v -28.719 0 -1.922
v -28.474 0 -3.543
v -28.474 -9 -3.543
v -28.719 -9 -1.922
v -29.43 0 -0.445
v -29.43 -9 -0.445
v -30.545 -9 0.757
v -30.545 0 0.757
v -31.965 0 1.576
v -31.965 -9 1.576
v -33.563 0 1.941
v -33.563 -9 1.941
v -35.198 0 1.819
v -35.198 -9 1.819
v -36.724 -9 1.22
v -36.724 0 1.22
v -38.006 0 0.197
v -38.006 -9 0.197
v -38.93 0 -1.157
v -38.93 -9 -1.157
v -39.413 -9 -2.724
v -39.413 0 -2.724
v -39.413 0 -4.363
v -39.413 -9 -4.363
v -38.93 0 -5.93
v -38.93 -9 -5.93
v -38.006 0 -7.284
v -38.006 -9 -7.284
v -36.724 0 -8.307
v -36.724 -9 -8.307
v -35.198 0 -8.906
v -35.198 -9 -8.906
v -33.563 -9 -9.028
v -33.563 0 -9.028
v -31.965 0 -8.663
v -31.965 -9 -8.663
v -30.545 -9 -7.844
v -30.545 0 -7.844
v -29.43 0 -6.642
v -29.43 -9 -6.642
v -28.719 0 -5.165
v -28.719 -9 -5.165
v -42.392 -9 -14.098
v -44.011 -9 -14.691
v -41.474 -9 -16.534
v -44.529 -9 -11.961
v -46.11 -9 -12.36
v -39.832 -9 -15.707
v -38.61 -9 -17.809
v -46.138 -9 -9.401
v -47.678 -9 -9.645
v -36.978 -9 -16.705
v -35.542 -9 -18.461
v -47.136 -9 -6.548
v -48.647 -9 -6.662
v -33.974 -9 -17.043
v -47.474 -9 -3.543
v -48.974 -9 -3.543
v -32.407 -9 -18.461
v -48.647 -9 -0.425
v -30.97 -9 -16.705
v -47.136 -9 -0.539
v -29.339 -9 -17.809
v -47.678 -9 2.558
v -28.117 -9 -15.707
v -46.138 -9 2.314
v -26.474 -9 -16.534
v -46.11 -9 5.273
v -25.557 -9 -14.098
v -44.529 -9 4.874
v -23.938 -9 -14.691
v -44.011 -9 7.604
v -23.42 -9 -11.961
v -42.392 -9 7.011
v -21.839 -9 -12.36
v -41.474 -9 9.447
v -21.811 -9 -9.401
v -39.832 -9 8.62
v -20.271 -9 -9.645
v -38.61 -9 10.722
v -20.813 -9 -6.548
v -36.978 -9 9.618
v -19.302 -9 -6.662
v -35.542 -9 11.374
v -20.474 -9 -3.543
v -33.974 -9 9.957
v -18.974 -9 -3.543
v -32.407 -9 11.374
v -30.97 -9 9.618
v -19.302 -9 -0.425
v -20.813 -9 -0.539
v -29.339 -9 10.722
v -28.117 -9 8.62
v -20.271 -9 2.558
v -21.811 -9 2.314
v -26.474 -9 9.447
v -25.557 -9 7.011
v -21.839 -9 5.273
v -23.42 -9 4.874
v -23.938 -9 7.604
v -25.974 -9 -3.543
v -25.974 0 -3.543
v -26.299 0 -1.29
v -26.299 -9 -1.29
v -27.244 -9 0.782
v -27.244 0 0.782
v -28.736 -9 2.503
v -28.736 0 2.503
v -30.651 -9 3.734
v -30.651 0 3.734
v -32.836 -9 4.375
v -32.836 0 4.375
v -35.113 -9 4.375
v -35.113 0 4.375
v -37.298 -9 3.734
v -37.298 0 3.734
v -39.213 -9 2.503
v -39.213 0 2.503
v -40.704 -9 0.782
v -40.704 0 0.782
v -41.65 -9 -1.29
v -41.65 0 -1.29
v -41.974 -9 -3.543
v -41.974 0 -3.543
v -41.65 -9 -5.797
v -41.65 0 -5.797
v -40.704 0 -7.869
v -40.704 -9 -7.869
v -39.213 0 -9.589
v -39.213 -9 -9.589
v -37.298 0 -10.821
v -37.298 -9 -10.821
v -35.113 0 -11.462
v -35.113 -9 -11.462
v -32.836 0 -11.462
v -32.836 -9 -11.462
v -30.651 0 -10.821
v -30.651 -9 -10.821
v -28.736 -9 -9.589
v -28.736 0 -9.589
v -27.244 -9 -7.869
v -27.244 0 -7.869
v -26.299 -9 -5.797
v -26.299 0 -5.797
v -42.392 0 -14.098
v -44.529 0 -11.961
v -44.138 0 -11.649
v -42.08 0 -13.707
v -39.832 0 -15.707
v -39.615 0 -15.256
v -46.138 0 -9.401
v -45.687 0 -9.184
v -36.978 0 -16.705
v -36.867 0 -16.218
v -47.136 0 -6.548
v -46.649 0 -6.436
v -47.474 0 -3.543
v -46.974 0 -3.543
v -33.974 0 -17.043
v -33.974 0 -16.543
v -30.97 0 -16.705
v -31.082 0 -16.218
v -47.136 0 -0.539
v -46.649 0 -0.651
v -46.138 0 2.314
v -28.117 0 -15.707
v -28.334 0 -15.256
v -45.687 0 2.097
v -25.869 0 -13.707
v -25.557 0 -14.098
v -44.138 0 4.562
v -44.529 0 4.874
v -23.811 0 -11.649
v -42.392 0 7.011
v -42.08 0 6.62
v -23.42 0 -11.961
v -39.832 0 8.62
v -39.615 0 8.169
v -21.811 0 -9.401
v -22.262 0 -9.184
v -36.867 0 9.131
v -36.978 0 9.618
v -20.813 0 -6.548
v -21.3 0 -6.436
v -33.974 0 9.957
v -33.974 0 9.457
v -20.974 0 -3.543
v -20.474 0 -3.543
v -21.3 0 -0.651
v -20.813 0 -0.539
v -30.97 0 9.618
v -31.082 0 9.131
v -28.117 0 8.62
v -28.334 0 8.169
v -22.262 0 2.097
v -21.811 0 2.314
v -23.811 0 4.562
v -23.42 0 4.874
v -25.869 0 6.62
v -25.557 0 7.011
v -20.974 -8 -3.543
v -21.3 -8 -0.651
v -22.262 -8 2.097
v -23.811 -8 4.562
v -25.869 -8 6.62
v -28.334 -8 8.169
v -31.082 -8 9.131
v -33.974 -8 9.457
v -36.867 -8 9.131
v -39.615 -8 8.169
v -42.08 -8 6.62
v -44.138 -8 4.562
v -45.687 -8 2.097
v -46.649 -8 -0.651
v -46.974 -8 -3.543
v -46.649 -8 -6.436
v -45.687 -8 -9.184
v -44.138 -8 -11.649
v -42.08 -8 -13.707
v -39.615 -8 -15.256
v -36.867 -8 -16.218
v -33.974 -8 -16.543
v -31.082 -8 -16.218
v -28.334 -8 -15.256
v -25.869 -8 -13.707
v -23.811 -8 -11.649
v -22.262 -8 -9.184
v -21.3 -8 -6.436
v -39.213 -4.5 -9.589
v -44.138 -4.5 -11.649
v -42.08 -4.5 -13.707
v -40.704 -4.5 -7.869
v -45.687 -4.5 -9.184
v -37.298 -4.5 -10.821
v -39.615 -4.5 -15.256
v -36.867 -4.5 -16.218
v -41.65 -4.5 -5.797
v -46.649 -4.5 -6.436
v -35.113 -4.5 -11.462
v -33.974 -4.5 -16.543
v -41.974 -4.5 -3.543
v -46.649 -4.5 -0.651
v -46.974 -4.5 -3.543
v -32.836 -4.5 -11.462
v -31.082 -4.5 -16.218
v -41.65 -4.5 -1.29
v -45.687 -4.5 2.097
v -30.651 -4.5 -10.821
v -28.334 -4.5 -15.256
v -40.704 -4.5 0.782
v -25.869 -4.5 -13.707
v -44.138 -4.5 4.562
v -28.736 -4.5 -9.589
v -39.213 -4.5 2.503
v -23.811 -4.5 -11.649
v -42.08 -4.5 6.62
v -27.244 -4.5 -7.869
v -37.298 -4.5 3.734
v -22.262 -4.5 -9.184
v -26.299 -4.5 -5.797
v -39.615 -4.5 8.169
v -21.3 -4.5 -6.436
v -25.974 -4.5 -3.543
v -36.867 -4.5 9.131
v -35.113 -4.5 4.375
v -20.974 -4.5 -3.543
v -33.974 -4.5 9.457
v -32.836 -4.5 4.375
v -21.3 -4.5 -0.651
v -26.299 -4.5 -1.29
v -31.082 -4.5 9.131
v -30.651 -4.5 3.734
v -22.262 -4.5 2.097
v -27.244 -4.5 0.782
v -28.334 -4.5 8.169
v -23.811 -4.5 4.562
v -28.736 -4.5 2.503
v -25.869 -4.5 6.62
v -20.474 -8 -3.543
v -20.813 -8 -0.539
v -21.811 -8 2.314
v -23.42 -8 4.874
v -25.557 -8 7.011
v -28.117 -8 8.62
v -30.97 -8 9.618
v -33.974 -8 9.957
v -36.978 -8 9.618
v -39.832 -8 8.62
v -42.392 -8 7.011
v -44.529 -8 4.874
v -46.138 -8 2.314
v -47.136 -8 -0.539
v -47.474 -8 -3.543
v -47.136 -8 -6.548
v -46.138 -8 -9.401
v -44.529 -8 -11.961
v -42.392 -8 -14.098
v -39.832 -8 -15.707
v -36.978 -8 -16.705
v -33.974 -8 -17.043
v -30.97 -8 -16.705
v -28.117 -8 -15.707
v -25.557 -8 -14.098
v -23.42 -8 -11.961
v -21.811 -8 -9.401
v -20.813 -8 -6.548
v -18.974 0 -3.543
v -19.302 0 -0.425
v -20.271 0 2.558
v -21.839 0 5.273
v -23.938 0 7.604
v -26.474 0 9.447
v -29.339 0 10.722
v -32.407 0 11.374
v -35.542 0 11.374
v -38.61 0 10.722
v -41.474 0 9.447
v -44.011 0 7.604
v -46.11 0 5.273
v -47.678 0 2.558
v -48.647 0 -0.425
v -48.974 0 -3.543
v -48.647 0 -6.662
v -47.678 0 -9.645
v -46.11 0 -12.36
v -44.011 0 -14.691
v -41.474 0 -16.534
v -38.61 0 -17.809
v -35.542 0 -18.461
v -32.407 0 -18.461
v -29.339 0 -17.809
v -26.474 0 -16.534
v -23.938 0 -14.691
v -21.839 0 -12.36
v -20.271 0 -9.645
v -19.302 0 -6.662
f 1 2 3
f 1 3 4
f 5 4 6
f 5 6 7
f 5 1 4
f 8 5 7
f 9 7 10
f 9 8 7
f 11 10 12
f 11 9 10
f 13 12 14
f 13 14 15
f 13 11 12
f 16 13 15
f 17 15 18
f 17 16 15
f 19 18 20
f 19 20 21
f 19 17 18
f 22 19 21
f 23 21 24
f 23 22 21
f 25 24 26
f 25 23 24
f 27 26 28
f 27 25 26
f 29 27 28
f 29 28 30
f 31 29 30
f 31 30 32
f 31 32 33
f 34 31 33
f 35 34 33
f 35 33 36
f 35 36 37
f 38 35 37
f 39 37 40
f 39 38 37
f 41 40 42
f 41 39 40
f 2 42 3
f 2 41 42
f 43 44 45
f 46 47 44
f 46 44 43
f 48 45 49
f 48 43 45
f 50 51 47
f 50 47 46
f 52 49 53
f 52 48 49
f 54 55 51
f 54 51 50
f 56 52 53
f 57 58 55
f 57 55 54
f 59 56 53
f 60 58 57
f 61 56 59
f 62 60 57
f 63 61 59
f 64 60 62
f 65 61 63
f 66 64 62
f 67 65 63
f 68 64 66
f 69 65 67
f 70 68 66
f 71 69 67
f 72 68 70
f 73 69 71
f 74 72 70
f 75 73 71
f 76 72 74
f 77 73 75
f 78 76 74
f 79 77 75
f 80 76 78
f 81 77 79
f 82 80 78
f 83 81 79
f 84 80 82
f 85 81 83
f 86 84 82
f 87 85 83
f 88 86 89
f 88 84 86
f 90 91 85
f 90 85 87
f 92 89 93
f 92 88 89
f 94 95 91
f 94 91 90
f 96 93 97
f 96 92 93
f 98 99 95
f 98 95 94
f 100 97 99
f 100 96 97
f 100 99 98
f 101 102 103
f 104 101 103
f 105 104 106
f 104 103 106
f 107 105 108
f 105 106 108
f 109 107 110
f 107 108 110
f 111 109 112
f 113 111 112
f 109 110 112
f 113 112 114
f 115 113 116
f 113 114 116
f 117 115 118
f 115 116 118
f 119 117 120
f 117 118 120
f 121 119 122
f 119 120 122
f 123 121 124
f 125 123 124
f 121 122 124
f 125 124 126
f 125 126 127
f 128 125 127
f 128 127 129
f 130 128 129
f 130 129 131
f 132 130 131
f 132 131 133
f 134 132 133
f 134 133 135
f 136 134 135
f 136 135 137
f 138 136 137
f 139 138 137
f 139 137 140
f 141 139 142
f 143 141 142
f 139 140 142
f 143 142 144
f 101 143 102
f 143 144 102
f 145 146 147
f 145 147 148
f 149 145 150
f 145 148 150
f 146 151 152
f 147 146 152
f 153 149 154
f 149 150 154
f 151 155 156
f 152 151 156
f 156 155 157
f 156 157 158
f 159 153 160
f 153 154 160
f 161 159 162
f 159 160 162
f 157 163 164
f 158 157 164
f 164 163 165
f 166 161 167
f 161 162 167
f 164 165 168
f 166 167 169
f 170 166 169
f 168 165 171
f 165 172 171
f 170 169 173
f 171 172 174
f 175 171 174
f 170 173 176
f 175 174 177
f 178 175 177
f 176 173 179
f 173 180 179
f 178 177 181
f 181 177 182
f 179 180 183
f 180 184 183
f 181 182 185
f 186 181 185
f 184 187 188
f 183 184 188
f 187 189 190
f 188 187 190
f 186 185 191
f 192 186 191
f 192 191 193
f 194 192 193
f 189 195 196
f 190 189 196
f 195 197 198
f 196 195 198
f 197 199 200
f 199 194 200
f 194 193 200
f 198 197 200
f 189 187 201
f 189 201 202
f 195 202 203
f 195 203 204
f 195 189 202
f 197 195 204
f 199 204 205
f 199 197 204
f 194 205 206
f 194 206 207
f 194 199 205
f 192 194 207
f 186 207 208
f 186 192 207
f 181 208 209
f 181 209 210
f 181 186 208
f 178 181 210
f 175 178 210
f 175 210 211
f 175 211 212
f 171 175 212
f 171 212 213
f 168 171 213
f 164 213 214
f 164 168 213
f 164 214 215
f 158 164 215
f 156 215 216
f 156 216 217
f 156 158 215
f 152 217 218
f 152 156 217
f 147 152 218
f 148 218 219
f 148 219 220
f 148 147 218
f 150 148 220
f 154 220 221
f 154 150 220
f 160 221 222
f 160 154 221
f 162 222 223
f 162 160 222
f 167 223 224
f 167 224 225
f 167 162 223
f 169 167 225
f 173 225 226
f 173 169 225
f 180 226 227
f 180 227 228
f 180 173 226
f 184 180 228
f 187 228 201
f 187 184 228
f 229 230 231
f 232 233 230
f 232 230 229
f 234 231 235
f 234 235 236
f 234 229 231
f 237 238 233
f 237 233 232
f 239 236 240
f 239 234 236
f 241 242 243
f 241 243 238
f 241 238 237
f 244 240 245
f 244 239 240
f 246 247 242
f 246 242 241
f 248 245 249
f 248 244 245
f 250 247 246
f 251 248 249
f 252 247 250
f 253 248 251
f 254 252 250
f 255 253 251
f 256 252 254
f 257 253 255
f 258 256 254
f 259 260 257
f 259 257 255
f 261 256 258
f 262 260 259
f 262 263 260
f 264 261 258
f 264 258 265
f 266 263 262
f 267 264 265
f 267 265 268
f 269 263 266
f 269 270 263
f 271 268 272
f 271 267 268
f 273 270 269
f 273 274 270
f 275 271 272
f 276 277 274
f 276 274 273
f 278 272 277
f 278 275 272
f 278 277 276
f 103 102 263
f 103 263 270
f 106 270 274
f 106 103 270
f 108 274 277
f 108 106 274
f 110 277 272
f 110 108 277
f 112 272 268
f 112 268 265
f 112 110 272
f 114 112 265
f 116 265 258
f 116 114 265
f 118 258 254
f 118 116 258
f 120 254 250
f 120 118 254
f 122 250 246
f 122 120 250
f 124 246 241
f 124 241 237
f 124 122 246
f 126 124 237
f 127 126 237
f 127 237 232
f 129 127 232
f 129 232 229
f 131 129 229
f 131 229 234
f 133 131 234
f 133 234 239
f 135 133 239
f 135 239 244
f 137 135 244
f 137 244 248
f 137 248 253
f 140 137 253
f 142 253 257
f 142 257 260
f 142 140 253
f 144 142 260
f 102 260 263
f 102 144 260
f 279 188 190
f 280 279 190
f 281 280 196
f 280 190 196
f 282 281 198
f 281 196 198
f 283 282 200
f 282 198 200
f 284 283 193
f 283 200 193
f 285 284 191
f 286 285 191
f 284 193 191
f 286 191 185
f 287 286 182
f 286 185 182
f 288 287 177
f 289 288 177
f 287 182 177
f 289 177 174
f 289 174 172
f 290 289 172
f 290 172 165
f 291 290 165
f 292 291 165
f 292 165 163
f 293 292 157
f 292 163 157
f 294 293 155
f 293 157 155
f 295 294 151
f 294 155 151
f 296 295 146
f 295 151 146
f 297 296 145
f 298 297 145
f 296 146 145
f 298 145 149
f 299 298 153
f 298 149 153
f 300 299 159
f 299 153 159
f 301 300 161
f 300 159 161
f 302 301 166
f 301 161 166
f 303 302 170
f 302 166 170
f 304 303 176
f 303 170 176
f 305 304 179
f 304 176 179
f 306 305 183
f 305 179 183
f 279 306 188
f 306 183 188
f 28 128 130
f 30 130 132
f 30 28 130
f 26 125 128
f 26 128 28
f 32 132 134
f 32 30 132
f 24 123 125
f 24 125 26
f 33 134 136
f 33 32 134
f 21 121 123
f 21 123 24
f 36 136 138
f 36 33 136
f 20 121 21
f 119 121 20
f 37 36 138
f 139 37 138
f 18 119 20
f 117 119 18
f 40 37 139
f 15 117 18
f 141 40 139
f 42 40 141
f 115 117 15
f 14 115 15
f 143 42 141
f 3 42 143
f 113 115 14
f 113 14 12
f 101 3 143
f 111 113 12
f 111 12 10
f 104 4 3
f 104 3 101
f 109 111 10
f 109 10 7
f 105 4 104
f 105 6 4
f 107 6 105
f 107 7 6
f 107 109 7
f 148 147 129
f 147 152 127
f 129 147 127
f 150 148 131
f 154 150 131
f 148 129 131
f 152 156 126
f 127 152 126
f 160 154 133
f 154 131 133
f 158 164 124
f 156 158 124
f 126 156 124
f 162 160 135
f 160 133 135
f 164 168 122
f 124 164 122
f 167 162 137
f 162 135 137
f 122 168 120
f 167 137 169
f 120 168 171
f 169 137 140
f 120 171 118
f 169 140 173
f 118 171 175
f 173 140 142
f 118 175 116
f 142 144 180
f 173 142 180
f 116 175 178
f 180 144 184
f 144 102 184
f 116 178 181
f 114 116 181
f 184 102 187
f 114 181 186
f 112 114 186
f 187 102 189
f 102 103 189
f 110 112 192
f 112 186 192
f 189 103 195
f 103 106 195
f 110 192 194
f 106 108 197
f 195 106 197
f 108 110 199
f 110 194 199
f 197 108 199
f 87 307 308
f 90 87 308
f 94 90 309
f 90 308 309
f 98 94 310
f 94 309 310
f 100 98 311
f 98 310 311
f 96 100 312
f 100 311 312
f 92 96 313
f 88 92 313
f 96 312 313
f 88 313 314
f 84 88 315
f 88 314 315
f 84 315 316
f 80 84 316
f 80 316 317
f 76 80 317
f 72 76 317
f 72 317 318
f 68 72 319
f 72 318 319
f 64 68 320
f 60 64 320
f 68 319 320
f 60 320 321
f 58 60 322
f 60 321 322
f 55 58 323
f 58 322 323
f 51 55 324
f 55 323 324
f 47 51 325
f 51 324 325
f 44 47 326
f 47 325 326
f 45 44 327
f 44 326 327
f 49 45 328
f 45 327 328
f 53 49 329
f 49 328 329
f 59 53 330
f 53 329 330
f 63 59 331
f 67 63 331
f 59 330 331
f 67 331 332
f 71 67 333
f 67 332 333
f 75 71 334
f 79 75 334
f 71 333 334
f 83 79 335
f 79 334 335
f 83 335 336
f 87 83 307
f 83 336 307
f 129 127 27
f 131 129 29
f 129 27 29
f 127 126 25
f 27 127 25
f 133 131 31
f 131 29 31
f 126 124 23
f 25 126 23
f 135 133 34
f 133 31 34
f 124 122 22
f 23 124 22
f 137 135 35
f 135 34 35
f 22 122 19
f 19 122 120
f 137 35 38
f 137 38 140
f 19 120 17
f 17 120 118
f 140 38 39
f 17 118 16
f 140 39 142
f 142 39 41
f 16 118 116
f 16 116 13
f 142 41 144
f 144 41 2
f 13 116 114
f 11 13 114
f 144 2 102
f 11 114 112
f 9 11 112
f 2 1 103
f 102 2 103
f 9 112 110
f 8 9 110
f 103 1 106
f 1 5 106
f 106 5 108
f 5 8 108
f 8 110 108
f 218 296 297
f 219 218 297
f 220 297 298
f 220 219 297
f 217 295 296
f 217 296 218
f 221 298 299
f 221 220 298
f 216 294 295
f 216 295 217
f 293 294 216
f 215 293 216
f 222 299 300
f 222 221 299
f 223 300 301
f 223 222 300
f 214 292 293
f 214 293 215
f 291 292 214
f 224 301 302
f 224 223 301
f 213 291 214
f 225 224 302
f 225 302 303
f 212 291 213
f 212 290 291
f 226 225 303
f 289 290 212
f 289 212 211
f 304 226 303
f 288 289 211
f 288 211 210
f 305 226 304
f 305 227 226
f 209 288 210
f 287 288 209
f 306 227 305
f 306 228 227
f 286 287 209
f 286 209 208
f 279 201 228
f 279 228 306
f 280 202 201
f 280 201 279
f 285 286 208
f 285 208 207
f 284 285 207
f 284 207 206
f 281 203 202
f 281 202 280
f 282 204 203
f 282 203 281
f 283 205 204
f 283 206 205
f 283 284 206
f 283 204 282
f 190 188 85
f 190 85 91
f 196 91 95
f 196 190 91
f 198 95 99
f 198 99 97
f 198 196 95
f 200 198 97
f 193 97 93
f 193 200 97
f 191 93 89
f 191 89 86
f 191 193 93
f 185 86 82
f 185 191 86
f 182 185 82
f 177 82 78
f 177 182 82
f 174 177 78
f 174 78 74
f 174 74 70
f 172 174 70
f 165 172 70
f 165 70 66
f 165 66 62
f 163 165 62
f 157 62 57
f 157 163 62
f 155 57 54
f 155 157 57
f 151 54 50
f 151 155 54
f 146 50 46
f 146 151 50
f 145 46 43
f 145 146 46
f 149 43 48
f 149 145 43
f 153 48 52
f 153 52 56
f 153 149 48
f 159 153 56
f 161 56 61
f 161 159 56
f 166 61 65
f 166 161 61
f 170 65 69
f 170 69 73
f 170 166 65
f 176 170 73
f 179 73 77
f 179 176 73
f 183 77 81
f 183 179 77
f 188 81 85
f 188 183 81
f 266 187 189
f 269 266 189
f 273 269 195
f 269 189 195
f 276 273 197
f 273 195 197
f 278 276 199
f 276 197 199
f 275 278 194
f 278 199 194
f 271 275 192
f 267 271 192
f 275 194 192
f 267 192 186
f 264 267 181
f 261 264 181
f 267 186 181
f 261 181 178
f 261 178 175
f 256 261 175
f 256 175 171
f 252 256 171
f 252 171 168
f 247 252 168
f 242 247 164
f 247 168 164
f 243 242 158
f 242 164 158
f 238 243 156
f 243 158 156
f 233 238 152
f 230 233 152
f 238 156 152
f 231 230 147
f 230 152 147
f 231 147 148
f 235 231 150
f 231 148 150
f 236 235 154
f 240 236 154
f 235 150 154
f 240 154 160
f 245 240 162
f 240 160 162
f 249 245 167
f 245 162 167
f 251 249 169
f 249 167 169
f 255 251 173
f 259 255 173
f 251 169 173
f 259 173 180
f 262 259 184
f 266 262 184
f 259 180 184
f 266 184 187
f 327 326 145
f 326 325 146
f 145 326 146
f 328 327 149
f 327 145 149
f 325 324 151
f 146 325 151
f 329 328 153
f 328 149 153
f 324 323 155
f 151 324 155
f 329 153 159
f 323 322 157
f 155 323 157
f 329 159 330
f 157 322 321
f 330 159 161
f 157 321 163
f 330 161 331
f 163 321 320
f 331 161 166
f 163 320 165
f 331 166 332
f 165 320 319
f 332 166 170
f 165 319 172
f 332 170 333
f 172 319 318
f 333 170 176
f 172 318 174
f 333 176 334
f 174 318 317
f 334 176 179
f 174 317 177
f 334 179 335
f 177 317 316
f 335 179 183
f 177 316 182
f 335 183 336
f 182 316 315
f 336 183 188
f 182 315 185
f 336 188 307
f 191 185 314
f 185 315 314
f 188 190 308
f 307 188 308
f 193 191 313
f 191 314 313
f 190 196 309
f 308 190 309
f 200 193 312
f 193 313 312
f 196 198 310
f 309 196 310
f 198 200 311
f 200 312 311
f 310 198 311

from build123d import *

# Parameters (mm, degrees)
F0_R     = 8
F0_R_2   = 5.5
F1_DEPTH = 9
F0_R_3   = 15
F0_R_4   = 13.5
F2_DEPTH = 9
F0_R_5   = 13
F3_DEPTH = 8
F4_DEPTH = 4.5


with BuildPart() as f1:
    # F0 (on Front) → F1 (new body)
    with BuildSketch(Plane.XZ):
        with Locations((-33.974461, -3.543496)):
            Circle(F0_R)
        with Locations((-33.974461, -3.543496)):
            Circle(F0_R_2, mode=Mode.SUBTRACT)
    extrude(amount=F1_DEPTH)


with BuildPart() as f2:
    # F0 (on Front) → F2 (new body)
    with BuildSketch(Plane.XZ):
        with Locations((-33.974461, -3.543496)):
            Circle(F0_R_3)
        with Locations((-33.974461, -3.543496)):
            Circle(F0_R_4, mode=Mode.SUBTRACT)
    extrude(amount=F2_DEPTH)


with BuildPart() as f3:
    # F0 (on Front) → F3 (new body)
    with BuildSketch(Plane.XZ):
        with Locations((-33.974461, -3.543496)):
            Circle(F0_R_4)
        with Locations((-33.974461, -3.543496)):
            Circle(F0_R_5, mode=Mode.SUBTRACT)
    extrude(amount=F3_DEPTH)


with BuildPart() as f4:
    # F0 (on Front) → F4 (new body)
    with BuildSketch(Plane.XZ):
        with Locations((-33.974461, -3.543496)):
            Circle(F0_R_5)
        with Locations((-33.974461, -3.543496)):
            Circle(F0_R, mode=Mode.SUBTRACT)
    extrude(amount=F4_DEPTH)


solid = Compound([f1.part, f2.part, f3.part, f4.part])
